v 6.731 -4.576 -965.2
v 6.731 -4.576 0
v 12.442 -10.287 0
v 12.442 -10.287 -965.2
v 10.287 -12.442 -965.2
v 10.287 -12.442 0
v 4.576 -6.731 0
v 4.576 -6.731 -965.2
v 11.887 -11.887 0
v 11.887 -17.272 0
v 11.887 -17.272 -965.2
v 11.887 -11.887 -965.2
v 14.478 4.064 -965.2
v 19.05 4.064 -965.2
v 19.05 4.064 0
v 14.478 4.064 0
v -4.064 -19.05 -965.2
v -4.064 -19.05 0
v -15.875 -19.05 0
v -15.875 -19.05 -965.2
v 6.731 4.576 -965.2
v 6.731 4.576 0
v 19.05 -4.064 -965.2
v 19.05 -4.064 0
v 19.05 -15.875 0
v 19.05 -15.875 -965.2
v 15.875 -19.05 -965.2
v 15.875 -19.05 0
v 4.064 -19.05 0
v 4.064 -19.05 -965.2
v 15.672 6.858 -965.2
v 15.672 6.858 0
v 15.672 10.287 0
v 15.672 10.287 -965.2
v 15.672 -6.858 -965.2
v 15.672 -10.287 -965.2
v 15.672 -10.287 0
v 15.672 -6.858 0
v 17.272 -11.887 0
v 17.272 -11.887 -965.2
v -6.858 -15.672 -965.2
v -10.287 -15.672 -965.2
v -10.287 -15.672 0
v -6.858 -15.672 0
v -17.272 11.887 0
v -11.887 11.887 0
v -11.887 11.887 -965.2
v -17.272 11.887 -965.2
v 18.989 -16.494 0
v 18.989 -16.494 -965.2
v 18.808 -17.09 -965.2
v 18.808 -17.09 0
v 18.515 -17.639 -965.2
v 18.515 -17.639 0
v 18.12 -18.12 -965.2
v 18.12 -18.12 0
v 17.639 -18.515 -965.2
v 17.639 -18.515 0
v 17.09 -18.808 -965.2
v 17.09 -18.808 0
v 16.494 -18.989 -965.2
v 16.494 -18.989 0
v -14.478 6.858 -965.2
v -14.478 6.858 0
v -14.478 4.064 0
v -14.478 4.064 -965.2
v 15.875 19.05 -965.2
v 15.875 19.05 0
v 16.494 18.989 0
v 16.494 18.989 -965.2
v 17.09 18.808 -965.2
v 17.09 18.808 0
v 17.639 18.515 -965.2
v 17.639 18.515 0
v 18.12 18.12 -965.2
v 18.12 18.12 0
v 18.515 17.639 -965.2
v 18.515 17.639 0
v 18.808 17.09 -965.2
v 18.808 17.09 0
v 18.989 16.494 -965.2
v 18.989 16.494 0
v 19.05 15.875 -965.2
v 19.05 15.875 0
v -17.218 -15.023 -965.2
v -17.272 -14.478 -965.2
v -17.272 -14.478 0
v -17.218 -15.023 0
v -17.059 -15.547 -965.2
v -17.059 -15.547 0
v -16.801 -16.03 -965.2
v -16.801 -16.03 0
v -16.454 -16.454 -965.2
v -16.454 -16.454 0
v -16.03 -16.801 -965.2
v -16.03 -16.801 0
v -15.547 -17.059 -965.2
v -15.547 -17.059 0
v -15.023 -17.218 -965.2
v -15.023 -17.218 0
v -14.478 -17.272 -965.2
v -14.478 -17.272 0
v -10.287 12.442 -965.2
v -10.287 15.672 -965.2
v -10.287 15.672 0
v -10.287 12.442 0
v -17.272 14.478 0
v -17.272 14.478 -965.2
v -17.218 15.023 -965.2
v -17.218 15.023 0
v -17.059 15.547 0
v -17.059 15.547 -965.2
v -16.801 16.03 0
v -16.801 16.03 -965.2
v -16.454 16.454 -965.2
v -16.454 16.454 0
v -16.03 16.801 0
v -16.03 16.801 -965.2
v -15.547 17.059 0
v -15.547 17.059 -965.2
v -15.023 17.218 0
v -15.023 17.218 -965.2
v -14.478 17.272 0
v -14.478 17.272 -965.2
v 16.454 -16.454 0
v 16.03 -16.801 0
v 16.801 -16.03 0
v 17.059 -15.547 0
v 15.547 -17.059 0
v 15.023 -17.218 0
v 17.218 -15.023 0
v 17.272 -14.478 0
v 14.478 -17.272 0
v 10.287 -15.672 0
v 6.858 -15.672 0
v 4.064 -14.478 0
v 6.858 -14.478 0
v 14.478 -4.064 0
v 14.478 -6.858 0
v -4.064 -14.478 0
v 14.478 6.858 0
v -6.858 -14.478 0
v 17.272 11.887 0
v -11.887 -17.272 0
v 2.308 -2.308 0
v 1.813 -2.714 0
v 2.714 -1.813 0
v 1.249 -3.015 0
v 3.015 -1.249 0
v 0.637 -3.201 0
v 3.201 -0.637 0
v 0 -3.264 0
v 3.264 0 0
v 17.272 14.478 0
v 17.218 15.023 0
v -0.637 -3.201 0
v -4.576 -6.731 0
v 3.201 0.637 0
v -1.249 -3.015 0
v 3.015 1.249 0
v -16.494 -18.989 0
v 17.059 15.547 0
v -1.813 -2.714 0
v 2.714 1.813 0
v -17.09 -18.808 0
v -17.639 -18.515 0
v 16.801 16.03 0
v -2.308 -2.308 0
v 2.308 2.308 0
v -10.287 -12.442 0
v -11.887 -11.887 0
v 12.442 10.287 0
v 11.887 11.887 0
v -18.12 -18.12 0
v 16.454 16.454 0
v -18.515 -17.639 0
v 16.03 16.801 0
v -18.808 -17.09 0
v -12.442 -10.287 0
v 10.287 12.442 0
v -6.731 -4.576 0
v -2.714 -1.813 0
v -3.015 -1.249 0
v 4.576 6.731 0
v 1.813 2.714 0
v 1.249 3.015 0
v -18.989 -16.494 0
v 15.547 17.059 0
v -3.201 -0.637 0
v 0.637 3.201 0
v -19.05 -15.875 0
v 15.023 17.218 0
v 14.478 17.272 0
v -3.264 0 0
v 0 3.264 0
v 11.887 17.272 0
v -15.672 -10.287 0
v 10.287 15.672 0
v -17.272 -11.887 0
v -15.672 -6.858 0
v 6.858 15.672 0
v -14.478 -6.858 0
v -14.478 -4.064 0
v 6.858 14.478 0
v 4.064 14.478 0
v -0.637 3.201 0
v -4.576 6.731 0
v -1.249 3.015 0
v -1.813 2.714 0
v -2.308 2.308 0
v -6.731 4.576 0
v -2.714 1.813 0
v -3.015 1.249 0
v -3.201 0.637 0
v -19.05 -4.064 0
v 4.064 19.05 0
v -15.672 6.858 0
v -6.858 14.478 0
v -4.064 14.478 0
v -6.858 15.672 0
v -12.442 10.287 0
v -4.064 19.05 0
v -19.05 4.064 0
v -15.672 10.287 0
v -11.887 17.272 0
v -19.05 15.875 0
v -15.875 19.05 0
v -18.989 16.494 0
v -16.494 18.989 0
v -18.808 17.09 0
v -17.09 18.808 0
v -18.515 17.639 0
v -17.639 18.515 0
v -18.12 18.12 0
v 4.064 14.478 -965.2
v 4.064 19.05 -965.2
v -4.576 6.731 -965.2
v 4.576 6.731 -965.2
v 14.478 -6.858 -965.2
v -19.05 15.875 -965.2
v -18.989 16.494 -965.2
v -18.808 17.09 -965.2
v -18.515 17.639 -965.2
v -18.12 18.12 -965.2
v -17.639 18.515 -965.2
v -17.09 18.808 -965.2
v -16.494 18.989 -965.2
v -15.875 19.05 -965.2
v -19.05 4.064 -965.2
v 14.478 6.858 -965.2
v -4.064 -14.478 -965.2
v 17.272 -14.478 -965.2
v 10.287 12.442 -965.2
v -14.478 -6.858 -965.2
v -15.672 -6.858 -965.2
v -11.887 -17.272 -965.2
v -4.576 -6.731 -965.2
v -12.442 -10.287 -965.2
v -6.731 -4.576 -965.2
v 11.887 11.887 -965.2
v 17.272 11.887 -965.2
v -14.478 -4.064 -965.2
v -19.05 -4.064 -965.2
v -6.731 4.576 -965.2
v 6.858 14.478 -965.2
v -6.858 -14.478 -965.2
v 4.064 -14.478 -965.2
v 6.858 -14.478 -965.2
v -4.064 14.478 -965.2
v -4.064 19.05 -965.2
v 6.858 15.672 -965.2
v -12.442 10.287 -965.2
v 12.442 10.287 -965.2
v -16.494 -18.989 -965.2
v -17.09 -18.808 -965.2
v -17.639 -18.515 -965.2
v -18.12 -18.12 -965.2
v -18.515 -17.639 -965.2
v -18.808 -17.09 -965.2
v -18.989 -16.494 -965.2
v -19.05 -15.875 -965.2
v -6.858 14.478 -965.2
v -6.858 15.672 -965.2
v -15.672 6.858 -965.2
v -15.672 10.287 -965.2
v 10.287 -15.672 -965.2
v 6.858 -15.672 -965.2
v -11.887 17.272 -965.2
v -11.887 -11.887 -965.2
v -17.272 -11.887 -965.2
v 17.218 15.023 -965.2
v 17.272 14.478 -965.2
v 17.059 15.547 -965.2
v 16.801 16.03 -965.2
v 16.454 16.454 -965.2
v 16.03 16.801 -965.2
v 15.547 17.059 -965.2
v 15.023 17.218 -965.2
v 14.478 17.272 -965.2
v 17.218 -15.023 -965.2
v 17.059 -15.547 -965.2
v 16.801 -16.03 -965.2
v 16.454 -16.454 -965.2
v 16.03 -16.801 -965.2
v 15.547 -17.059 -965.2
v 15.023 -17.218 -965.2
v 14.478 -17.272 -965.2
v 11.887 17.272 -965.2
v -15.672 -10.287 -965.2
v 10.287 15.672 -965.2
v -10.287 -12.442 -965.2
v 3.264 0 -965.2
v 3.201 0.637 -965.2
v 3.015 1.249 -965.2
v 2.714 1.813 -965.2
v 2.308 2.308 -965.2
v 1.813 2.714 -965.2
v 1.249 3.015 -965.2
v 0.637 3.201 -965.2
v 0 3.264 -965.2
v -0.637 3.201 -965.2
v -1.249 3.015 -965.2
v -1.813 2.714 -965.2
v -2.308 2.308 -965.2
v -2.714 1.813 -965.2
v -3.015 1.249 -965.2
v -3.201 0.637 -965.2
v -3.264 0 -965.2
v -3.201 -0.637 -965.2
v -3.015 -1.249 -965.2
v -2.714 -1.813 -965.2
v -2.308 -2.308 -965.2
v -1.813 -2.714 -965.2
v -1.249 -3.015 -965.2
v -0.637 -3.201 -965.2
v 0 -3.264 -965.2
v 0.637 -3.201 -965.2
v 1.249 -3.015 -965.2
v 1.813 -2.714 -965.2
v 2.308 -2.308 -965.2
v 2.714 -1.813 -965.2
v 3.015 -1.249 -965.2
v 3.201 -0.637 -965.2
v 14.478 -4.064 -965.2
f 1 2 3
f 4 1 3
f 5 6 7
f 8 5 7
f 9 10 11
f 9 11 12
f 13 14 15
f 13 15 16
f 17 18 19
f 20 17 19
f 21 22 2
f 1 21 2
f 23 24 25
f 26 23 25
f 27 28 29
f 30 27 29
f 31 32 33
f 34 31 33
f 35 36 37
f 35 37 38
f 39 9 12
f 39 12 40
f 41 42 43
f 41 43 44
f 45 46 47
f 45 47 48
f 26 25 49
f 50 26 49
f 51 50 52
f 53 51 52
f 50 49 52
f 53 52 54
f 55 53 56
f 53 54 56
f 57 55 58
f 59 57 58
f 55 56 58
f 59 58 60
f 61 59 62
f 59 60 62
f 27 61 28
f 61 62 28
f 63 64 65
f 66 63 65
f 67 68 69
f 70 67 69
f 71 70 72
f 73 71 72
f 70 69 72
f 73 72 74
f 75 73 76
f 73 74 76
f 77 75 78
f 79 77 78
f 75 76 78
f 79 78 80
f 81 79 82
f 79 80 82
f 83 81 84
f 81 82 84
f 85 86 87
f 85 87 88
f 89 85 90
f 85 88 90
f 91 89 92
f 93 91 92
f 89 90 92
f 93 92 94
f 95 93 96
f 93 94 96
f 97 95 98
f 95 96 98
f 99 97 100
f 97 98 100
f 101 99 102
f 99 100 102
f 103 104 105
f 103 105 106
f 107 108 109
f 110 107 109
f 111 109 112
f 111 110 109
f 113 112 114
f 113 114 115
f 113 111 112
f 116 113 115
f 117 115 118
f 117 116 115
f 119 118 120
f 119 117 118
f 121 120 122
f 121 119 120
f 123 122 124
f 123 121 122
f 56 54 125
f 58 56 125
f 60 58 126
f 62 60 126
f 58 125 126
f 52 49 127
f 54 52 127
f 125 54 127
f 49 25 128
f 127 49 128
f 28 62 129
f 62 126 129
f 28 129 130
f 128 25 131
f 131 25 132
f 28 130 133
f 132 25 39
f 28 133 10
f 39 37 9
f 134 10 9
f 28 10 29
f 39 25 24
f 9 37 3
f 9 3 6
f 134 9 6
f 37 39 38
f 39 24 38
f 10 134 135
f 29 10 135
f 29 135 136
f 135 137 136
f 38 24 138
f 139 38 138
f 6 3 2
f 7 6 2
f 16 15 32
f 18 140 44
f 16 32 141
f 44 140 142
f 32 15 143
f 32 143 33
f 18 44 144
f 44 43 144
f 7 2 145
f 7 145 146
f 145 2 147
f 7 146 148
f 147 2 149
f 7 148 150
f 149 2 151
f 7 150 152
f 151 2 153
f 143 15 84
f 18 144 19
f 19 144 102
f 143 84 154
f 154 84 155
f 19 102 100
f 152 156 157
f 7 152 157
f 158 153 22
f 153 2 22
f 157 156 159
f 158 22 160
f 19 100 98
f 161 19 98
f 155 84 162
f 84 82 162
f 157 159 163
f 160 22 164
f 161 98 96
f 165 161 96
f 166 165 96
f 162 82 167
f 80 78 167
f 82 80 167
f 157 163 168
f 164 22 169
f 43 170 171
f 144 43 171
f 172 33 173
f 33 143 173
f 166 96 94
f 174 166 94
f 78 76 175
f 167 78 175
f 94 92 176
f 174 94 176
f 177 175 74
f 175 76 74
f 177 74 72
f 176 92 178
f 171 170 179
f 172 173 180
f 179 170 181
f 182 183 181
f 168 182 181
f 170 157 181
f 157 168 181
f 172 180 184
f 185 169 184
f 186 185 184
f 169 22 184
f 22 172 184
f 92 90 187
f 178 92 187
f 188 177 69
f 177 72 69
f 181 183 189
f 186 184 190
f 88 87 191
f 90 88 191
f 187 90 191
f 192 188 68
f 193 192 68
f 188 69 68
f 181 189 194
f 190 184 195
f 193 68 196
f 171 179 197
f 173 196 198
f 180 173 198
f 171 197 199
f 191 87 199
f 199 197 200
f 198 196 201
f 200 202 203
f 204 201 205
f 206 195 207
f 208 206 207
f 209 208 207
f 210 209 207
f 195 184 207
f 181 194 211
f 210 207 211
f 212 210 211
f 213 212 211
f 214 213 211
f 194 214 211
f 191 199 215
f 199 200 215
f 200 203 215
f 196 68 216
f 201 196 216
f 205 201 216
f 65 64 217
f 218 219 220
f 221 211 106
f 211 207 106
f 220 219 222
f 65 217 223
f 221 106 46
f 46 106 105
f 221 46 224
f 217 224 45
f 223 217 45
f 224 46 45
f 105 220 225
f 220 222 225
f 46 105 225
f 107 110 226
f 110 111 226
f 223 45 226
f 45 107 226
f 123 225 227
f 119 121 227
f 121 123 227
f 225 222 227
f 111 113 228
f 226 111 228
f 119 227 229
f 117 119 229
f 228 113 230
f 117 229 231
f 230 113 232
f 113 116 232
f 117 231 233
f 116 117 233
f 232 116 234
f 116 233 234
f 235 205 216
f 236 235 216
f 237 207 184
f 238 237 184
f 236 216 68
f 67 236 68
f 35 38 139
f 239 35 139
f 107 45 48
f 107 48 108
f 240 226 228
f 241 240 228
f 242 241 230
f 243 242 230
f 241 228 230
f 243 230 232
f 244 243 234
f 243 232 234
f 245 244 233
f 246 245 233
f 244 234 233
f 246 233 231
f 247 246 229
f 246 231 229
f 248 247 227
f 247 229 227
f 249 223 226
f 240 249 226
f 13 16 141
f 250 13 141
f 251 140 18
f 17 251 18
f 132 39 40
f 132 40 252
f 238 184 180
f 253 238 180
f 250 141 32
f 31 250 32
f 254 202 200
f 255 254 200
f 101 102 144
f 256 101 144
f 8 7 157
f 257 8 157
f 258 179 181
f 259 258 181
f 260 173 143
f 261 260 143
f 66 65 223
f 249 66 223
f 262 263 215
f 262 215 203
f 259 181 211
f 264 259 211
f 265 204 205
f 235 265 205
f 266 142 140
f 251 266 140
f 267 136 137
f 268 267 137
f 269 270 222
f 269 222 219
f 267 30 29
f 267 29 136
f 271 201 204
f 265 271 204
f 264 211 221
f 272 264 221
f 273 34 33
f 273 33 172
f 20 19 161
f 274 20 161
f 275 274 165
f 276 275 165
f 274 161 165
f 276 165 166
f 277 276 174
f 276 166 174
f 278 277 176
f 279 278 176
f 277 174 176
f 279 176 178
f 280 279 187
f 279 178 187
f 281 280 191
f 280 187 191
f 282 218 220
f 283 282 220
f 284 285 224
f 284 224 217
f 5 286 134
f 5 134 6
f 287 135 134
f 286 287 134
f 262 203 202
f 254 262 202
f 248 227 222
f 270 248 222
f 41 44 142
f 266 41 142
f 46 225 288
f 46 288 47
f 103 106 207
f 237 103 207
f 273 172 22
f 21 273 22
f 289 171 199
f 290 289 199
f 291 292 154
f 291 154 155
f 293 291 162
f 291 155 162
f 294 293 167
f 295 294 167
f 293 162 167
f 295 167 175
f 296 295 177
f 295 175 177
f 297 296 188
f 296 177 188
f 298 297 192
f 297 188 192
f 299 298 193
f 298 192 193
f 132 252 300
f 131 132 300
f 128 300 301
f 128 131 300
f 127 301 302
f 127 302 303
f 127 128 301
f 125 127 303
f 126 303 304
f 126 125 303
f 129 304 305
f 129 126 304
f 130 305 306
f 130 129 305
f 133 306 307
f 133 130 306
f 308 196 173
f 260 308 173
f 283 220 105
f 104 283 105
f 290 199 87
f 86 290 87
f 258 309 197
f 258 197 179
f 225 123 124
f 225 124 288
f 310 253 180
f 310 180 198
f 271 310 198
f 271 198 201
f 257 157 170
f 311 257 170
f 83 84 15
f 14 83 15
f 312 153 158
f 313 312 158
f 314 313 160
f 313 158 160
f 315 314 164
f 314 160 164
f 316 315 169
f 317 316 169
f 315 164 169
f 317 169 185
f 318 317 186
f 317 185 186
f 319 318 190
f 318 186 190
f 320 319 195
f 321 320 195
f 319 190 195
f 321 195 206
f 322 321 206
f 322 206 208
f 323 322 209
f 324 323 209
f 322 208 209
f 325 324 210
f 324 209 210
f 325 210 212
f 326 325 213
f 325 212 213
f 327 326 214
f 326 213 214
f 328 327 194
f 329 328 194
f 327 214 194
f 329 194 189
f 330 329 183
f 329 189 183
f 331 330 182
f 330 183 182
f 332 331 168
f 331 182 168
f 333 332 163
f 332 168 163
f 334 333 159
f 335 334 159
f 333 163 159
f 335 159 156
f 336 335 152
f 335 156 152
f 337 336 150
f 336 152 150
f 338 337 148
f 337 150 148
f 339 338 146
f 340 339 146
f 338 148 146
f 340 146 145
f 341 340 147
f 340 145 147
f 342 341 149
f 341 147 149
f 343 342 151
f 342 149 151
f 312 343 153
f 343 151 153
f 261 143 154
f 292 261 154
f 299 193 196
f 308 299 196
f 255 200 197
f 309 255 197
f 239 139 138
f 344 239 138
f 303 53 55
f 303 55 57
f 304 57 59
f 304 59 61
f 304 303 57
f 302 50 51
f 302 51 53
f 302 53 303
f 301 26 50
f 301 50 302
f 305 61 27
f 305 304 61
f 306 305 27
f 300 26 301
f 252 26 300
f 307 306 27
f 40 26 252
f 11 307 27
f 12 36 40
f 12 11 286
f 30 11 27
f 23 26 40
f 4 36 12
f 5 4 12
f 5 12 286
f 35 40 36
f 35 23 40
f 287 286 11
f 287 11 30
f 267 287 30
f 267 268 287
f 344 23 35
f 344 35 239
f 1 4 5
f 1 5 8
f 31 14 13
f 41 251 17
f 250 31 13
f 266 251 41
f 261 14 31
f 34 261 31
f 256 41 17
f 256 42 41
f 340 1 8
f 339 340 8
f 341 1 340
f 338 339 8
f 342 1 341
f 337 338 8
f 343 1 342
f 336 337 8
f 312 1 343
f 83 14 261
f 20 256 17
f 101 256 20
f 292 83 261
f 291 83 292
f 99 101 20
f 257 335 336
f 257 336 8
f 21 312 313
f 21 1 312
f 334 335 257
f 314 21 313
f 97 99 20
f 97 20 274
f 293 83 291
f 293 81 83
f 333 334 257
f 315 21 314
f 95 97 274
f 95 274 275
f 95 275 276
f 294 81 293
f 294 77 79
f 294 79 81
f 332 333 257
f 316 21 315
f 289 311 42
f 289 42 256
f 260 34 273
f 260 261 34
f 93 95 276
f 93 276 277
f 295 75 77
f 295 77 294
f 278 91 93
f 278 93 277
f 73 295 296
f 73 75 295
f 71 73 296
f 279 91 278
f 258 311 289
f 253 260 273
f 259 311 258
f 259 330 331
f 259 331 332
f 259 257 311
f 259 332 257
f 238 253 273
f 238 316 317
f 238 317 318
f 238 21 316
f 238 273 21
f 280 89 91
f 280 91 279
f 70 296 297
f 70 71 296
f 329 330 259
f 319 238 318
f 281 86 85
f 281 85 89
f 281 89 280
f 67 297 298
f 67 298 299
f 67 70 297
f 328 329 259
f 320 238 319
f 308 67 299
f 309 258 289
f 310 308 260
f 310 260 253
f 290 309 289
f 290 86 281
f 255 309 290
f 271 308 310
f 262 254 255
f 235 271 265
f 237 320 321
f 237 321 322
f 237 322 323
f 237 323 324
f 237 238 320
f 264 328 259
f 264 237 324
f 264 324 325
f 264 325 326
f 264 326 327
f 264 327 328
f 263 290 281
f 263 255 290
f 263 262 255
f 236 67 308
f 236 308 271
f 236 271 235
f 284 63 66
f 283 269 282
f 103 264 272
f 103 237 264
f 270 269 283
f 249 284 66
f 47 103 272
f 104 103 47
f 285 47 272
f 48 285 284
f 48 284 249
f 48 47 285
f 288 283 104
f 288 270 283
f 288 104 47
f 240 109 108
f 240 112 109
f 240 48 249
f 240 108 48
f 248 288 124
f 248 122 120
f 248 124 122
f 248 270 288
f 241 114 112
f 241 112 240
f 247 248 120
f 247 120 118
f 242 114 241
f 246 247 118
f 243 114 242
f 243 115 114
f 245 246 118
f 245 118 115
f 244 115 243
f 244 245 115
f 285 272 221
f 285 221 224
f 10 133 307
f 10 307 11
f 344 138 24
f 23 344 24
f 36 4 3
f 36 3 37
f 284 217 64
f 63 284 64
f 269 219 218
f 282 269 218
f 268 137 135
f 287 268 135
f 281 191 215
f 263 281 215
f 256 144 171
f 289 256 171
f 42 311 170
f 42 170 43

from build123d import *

# Parameters (mm, degrees)
SKETCH1_R      = 3.2639
FINALCUT_DEPTH = 965.2


with BuildPart() as part:
    # Sketch1 → FinalCut (new body)
    with BuildSketch(Plane.XY):
        with BuildLine():
            Line((-6.731, 0), (-6.731, 4.575738531))
            Line((-6.731, 4.575738531), (-12.442261469, 10.287))
            Line((-12.442261469, 10.287), (-15.6718, 10.287))
            Line((-15.6718, 10.287), (-15.6718, 6.858))
            Line((-15.6718, 6.858), (-14.478, 6.858))
            Line((-14.478, 6.858), (-14.478, 4.064))
            Line((-14.478, 4.064), (-19.05, 4.064))
            Line((-19.05, 4.064), (-19.05, 15.875))
            ThreePointArc((-19.05, 15.875), (-18.12006403, 18.12006403), (-15.875, 19.05))
            Line((-15.875, 19.05), (-4.064, 19.05))
            Line((-4.064, 19.05), (-4.064, 14.478))
            Line((-4.064, 14.478), (-6.858, 14.478))
            Line((-6.858, 14.478), (-6.858, 15.6718))
            Line((-6.858, 15.6718), (-10.287, 15.6718))
            Line((-10.287, 15.6718), (-10.287, 12.442261469))
            Line((-10.287, 12.442261469), (-4.575738531, 6.731))
            Line((-4.575738531, 6.731), (0, 6.731))
            Line((0, 6.731), (4.575738531, 6.731))
            Line((4.575738531, 6.731), (10.287, 12.442261469))
            Line((10.287, 12.442261469), (10.287, 15.6718))
            Line((10.287, 15.6718), (6.858, 15.6718))
            Line((6.858, 15.6718), (6.858, 14.478))
            Line((6.858, 14.478), (4.064, 14.478))
            Line((4.064, 14.478), (4.064, 19.05))
            Line((4.064, 19.05), (15.875, 19.05))
            ThreePointArc((15.875, 19.05), (18.12006403, 18.12006403), (19.05, 15.875))
            Line((19.05, 15.875), (19.05, 4.064))
            Line((19.05, 4.064), (14.478, 4.064))
            Line((14.478, 4.064), (14.478, 6.858))
            Line((14.478, 6.858), (15.6718, 6.858))
            Line((15.6718, 6.858), (15.6718, 10.287))
            Line((15.6718, 10.287), (12.442261469, 10.287))
            Line((12.442261469, 10.287), (6.731, 4.575738531))
            Line((6.731, 4.575738531), (6.731, 0))
            Line((6.731, 0), (6.731, -4.575738531))
            Line((6.731, -4.575738531), (12.442261469, -10.287))
            Line((12.442261469, -10.287), (15.6718, -10.287))
            Line((15.6718, -10.287), (15.6718, -6.858))
            Line((15.6718, -6.858), (14.478, -6.858))
            Line((14.478, -6.858), (14.478, -4.064))
            Line((14.478, -4.064), (19.05, -4.064))
            Line((19.05, -4.064), (19.05, -15.875))
            ThreePointArc((19.05, -15.875), (18.12006403, -18.12006403), (15.875, -19.05))
            Line((15.875, -19.05), (4.064, -19.05))
            Line((4.064, -19.05), (4.064, -14.478))
            Line((4.064, -14.478), (6.858, -14.478))
            Line((6.858, -14.478), (6.858, -15.6718))
            Line((6.858, -15.6718), (10.287, -15.6718))
            Line((10.287, -15.6718), (10.287, -12.442261469))
            Line((10.287, -12.442261469), (4.575738531, -6.731))
            Line((4.575738531, -6.731), (0, -6.731))
            Line((0, -6.731), (-4.575738531, -6.731))
            Line((-4.575738531, -6.731), (-10.287, -12.442261469))
            Line((-10.287, -12.442261469), (-10.287, -15.6718))
            Line((-10.287, -15.6718), (-6.858, -15.6718))
            Line((-6.858, -15.6718), (-6.858, -14.478))
            Line((-6.858, -14.478), (-4.064, -14.478))
            Line((-4.064, -14.478), (-4.064, -19.05))
            Line((-4.064, -19.05), (-15.875, -19.05))
            ThreePointArc((-15.875, -19.05), (-18.12006403, -18.12006403), (-19.05, -15.875))
            Line((-19.05, -15.875), (-19.05, -4.064))
            Line((-19.05, -4.064), (-14.478, -4.064))
            Line((-14.478, -4.064), (-14.478, -6.858))
            Line((-14.478, -6.858), (-15.6718, -6.858))
            Line((-15.6718, -6.858), (-15.6718, -10.287))
            Line((-15.6718, -10.287), (-12.442261469, -10.287))
            Line((-12.442261469, -10.287), (-6.731, -4.575738531))
            Line((-6.731, -4.575738531), (-6.731, 0))
        make_face()
        Circle(SKETCH1_R, mode=Mode.SUBTRACT)
        with BuildLine():
            Line((17.272, 11.8872), (17.272, 14.478))
            ThreePointArc((17.272, 14.478), (16.453656347, 16.453656347), (14.478, 17.272))
            Line((14.478, 17.272), (11.8872, 17.272))
            Line((11.8872, 17.272), (11.8872, 11.8872))
            Line((11.8872, 11.8872), (17.272, 11.8872))
        make_face(mode=Mode.SUBTRACT)
        with BuildLine():
            Line((11.8872, -11.8872), (17.272, -11.8872))
            Line((17.272, -11.8872), (17.272, -14.478))
            ThreePointArc((17.272, -14.478), (16.453656347, -16.453656347), (14.478, -17.272))
            Line((14.478, -17.272), (11.8872, -17.272))
            Line((11.8872, -17.272), (11.8872, -11.8872))
        make_face(mode=Mode.SUBTRACT)
        with BuildLine():
            Line((-17.272, -11.8872), (-17.272, -14.478))
            ThreePointArc((-17.272, -14.478), (-16.453656347, -16.453656347), (-14.478, -17.272))
            Line((-14.478, -17.272), (-11.8872, -17.272))
            Line((-11.8872, -17.272), (-11.8872, -11.8872))
            Line((-11.8872, -11.8872), (-17.272, -11.8872))
        make_face(mode=Mode.SUBTRACT)
        with BuildLine():
            Line((-11.8872, 11.8872), (-17.272, 11.8872))
            Line((-17.272, 11.8872), (-17.272, 14.478))
            ThreePointArc((-17.272, 14.478), (-16.453656347, 16.453656347), (-14.478, 17.272))
            Line((-14.478, 17.272), (-11.8872, 17.272))
            Line((-11.8872, 17.272), (-11.8872, 11.8872))
        make_face(mode=Mode.SUBTRACT)
    extrude(amount=-FINALCUT_DEPTH)


solid = part.part
